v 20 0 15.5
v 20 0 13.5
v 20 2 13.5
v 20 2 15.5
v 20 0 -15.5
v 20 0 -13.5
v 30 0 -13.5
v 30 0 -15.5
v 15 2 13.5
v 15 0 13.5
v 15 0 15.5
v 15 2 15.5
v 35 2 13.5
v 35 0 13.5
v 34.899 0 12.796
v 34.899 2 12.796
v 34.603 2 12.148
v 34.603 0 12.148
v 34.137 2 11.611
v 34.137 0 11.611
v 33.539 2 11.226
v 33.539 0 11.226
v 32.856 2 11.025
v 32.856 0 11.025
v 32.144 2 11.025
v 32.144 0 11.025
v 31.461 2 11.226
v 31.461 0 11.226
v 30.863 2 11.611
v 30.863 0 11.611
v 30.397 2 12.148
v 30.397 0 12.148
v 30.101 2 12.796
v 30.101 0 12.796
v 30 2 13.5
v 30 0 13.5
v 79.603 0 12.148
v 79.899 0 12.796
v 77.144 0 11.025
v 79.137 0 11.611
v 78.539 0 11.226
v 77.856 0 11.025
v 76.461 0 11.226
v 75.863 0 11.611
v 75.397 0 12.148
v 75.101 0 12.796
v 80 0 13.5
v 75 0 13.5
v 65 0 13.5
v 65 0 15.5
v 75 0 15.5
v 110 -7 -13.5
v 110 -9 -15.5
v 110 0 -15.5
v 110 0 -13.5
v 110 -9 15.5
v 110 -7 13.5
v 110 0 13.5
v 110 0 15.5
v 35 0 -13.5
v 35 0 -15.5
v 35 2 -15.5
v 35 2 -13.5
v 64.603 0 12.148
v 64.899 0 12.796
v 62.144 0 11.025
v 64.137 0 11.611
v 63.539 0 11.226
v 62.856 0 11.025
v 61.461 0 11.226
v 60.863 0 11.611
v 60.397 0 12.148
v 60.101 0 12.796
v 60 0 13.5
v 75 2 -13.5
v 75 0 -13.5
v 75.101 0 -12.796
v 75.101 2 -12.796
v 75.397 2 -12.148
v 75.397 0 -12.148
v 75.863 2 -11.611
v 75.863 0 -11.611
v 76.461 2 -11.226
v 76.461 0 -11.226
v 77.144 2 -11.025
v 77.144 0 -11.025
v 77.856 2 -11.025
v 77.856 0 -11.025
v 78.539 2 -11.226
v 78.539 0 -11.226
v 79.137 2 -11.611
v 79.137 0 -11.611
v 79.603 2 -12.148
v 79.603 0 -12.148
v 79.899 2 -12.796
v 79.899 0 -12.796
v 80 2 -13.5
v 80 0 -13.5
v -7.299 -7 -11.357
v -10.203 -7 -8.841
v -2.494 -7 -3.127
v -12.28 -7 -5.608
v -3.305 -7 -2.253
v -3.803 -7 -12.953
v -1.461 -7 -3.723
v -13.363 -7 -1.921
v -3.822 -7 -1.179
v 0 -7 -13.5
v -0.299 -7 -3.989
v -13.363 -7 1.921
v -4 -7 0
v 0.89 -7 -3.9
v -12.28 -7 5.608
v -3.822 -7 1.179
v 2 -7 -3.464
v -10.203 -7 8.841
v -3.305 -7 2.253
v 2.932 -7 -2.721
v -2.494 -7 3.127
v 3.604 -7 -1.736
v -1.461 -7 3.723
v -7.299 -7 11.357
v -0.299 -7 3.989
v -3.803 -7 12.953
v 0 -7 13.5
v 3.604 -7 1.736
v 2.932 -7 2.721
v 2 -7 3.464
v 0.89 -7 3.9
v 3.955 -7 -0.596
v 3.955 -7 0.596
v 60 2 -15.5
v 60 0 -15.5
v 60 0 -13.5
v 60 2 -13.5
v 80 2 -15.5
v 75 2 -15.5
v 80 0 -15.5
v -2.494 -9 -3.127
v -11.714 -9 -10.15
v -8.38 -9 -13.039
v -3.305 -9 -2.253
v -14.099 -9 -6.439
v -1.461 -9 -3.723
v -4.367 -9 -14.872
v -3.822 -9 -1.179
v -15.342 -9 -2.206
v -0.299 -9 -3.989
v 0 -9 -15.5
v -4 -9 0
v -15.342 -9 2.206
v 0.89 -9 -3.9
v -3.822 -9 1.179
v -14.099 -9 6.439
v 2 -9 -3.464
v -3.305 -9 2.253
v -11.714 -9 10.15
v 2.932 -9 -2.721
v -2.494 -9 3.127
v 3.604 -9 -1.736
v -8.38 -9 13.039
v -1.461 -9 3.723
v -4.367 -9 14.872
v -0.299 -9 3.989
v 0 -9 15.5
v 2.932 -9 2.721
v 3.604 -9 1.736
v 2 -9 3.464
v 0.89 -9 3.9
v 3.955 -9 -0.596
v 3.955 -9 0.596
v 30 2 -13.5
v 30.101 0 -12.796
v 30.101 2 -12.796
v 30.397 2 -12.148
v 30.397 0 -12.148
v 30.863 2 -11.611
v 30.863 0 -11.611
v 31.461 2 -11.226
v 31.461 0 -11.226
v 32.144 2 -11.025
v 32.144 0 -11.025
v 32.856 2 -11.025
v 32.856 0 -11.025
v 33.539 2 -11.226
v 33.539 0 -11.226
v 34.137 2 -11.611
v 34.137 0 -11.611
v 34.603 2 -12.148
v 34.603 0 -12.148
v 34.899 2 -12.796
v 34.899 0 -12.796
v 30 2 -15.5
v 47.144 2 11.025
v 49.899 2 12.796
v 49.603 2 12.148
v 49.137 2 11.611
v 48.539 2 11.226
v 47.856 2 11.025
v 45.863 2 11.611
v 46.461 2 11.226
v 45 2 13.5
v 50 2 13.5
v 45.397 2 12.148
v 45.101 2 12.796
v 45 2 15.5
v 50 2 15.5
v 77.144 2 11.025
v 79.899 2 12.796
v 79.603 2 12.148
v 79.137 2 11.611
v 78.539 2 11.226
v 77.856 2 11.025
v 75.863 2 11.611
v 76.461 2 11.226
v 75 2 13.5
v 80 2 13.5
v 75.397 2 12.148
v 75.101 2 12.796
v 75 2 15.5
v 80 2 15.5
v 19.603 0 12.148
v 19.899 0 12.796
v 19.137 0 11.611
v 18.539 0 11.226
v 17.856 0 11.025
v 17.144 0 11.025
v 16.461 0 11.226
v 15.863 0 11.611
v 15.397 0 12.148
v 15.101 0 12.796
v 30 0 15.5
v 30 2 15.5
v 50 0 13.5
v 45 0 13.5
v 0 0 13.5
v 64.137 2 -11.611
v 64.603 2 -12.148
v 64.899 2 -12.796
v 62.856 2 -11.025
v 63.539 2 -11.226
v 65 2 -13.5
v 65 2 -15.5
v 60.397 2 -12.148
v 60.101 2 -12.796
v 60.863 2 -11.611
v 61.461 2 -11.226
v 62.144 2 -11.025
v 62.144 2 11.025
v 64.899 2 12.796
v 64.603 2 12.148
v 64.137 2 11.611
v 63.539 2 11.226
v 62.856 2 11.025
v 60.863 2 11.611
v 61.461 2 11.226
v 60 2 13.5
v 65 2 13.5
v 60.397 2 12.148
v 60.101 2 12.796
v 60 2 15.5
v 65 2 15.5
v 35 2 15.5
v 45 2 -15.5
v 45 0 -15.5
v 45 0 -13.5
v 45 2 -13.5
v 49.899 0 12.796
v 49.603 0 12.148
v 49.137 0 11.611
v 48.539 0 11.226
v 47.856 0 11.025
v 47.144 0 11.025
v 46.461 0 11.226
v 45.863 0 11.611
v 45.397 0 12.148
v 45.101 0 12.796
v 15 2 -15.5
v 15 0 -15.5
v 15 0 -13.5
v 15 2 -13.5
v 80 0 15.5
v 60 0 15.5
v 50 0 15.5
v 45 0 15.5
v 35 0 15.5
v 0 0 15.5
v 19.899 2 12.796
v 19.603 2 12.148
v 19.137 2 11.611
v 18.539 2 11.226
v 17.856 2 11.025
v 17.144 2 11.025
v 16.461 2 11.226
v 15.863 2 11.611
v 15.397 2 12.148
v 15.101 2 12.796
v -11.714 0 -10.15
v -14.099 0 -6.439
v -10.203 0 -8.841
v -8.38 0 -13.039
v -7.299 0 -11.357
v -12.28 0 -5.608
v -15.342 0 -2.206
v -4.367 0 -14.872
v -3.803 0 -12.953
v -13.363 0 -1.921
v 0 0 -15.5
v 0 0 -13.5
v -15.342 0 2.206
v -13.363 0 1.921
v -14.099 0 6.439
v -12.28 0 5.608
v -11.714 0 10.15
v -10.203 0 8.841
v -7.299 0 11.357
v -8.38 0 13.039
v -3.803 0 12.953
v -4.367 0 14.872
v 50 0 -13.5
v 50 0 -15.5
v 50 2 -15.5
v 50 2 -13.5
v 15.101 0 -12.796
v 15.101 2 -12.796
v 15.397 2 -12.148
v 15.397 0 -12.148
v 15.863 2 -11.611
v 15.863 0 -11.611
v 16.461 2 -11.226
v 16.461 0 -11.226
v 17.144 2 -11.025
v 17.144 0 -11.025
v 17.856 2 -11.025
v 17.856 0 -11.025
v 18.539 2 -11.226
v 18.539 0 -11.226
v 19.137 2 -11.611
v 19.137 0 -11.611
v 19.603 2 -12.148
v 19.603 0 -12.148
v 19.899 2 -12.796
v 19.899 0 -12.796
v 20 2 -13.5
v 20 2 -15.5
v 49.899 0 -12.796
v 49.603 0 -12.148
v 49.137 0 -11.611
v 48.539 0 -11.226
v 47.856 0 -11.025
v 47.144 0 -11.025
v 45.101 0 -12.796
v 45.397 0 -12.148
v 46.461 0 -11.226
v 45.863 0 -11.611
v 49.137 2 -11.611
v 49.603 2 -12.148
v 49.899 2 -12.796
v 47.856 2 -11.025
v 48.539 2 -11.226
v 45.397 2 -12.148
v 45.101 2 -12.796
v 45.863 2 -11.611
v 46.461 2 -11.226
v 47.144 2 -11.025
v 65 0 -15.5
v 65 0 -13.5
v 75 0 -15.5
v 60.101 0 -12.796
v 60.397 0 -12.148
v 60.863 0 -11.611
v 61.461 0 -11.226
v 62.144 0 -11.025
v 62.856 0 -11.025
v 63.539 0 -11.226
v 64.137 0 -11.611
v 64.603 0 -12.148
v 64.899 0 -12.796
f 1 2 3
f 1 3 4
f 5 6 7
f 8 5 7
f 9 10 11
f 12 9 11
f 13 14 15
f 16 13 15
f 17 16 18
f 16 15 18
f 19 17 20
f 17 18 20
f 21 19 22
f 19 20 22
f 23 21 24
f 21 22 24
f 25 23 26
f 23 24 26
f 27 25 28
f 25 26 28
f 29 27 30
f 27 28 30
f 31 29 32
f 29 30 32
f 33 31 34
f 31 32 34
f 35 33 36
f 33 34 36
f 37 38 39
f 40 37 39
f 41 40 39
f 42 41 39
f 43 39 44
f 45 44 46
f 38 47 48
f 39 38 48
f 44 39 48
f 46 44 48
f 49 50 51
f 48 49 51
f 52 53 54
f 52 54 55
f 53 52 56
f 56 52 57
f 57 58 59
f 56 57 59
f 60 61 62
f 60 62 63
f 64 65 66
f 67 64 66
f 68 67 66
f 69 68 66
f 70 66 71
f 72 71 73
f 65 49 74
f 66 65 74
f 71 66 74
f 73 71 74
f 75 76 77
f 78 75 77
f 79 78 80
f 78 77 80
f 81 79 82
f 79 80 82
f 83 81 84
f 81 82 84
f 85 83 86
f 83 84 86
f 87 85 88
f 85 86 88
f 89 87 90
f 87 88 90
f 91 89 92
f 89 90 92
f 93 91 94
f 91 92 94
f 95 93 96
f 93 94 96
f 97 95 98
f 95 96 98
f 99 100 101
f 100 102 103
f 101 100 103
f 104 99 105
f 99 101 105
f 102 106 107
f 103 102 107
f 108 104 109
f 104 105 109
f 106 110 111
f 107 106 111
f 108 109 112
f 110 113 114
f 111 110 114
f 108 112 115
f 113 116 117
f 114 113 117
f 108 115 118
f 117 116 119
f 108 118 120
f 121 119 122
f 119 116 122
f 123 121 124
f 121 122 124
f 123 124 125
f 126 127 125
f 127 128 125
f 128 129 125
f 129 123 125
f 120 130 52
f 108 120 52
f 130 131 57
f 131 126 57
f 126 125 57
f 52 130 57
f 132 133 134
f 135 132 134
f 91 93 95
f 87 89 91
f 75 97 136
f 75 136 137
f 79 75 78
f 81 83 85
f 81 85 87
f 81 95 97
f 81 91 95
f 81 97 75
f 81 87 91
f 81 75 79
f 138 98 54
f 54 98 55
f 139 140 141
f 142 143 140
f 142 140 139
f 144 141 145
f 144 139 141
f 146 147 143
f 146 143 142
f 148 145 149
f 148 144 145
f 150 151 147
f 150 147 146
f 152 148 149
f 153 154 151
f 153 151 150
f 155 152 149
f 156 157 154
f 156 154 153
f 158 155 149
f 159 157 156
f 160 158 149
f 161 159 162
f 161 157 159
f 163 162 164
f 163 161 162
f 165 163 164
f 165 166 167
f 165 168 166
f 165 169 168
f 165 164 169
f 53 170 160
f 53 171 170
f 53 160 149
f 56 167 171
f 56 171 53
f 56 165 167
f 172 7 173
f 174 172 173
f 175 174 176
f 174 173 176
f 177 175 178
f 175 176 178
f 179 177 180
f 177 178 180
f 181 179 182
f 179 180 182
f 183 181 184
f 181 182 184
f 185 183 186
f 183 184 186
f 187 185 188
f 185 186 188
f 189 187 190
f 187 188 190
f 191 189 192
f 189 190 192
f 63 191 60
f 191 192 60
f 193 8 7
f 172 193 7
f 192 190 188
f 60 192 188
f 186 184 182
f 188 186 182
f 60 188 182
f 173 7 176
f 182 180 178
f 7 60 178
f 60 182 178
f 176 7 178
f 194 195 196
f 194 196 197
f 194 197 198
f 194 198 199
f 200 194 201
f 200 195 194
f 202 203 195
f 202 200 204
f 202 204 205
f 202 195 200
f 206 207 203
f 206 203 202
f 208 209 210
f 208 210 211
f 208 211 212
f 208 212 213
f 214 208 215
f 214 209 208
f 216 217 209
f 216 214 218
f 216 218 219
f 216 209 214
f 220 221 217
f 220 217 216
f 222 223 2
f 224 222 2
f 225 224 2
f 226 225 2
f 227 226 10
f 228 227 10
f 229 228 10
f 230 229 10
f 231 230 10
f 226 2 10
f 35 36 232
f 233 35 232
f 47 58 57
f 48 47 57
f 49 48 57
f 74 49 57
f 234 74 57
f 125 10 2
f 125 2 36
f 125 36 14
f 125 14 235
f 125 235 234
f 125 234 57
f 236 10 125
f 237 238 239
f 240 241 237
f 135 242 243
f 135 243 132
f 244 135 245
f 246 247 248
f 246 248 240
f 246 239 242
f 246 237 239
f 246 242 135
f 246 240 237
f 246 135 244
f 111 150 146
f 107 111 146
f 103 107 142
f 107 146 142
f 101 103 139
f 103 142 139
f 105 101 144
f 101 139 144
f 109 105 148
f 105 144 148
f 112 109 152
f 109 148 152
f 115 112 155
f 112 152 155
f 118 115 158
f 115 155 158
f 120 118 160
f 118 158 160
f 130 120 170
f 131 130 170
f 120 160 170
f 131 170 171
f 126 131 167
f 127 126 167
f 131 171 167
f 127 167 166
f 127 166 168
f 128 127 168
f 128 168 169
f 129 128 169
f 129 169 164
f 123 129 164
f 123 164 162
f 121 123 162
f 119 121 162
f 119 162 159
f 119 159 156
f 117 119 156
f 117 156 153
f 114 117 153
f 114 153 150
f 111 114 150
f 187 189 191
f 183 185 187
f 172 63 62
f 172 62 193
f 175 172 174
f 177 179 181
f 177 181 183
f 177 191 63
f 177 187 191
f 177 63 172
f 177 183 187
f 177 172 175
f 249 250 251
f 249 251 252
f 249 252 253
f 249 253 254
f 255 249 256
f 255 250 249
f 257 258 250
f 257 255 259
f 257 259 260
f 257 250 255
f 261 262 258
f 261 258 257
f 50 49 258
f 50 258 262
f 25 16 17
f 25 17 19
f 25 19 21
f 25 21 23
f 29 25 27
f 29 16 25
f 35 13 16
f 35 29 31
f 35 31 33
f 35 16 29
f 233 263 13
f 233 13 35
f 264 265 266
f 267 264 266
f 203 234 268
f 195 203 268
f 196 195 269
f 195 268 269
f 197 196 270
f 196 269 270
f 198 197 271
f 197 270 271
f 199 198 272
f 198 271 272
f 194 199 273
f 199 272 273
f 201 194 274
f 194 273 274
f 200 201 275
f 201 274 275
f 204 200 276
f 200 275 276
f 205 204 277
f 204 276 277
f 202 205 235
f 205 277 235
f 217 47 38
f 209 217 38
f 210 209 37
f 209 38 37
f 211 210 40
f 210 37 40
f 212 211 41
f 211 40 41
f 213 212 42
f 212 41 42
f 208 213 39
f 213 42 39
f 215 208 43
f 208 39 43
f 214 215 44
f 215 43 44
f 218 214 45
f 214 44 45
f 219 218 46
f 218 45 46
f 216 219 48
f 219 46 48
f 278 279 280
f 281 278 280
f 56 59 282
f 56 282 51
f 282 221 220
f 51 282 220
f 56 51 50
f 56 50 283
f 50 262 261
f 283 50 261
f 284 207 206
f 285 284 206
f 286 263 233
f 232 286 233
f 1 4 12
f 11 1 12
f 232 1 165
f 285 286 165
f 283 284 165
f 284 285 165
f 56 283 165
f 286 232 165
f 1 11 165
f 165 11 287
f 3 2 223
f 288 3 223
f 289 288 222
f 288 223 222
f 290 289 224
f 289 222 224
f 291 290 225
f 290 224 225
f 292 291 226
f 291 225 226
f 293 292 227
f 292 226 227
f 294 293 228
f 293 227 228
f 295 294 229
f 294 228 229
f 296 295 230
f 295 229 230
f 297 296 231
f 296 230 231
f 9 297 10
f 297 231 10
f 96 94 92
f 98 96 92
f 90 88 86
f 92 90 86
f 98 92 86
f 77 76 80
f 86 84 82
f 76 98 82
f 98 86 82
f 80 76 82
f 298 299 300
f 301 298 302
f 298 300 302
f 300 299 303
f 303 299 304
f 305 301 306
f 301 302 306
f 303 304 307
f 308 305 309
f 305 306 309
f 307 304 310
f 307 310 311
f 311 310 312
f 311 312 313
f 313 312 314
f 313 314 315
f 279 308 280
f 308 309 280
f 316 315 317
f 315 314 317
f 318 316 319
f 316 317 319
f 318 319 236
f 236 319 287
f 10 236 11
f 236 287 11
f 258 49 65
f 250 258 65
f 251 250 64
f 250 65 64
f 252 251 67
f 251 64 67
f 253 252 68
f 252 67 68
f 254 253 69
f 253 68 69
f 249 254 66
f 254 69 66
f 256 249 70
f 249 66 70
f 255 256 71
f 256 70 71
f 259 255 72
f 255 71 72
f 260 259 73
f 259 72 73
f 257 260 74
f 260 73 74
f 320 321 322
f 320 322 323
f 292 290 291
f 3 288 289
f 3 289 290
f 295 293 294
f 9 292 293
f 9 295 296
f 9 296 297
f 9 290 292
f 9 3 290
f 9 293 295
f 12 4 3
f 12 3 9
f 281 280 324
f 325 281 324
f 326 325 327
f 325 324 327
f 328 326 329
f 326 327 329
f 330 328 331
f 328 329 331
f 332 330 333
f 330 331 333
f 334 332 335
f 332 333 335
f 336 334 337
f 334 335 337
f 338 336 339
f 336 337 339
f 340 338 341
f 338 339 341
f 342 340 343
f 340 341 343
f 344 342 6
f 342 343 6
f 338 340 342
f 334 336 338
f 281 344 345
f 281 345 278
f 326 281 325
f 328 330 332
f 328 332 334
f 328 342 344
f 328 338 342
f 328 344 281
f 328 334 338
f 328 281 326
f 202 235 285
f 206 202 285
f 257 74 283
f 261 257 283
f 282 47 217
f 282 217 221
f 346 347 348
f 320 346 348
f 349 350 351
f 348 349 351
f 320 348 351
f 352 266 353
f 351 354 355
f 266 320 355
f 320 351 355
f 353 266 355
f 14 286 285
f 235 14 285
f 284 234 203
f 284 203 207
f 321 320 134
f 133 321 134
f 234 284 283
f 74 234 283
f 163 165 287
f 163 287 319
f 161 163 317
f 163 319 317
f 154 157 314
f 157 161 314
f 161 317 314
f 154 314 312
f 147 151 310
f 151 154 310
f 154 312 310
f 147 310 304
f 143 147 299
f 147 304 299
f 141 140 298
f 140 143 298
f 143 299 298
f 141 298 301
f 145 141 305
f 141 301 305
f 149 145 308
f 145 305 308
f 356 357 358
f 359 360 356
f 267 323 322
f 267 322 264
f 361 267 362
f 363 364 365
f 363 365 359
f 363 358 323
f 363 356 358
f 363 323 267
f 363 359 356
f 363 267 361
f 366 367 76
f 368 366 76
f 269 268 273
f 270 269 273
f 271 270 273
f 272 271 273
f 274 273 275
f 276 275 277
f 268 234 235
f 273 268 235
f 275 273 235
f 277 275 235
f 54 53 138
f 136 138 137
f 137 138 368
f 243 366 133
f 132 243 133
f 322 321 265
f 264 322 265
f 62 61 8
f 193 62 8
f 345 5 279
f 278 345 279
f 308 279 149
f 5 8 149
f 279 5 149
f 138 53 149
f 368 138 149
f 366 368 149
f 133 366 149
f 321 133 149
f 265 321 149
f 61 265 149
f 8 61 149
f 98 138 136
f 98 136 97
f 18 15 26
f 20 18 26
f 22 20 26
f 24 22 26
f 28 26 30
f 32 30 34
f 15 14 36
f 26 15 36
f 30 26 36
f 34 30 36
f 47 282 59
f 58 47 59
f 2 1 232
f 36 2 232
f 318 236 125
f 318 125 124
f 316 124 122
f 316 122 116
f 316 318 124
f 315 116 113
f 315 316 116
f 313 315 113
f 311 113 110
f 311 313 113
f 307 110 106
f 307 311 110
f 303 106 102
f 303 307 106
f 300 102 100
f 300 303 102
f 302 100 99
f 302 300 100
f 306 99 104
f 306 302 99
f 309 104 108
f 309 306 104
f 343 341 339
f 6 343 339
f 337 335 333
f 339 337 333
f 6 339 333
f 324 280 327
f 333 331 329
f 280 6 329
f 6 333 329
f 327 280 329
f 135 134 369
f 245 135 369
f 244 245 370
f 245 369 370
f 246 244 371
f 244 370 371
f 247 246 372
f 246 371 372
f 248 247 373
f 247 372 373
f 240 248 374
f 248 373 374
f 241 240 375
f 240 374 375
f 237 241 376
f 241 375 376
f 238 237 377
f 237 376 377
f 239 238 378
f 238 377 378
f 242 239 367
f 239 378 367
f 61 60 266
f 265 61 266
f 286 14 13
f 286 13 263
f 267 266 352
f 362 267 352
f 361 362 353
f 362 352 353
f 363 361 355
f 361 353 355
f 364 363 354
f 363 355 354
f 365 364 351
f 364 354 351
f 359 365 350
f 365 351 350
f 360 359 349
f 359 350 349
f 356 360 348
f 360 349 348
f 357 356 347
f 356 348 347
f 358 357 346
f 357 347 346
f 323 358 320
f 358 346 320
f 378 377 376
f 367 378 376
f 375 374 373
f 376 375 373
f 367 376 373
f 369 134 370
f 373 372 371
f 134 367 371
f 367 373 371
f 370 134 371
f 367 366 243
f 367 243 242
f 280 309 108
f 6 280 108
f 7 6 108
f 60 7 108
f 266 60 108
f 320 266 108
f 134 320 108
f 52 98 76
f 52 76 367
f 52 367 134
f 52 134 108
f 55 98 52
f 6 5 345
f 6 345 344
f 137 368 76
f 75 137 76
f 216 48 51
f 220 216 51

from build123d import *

# Parameters (mm, degrees)
F1_DEPTH = 7
F2_T     = 2
F3_D     = 8
F4_W     = 5
F4_H     = 2
F5_DEPTH = 2


# Not quite as in the source:
# - a feature of the source that left no trace in its solid (it failed there, or was rolled back) is left out


with BuildPart() as f1:
    # F0 (on Front) → F1 (new body)
    with BuildSketch(Plane.XZ):
        with BuildLine():
            ThreePointArc((0, -13.5), (9.545941546, -9.545941546), (13.5, 0))
            ThreePointArc((13.5, 0), (9.545941546, 9.545941546), (0, 13.5))
            Line((0, 13.5), (0, -13.5))
        make_face()
        with BuildLine():
            ThreePointArc((0, 13.5), (9.545941546, 9.545941546), (13.5, 0))
            ThreePointArc((13.5, 0), (9.545941546, -9.545941546), (0, -13.5))
            Line((0, -13.5), (110, -13.5))
            Line((110, -13.5), (110, 13.5))
            Line((110, 13.5), (0, 13.5))
        make_face()
        with BuildLine():
            Line((0, -13.5), (0, 13.5))
            ThreePointArc((0, 13.5), (-13.5, 0), (0, -13.5))
        make_face()
    extrude(amount=F1_DEPTH)

    # F2
    f2_openings = [f1.faces().sort_by_distance(p)[0] for p in [
        (49.660922, 0, 0),
        (110, -3.5, 0),
    ]]
    offset(amount=F2_T, openings=f2_openings, kind=Kind.INTERSECTION)

    # F3 (through all)
    with Locations(Plane(origin=(0, 0, 0), x_dir=(1, 0, 0), z_dir=(0, 1, 0))):
        with Locations((0, 0)):
            Hole(F3_D / 2)

    # F4 (on face) → F5 (join)
    with BuildSketch(Plane(origin=(0, 0, 0), x_dir=(-1, 0, 0), z_dir=(0, 1, 0))):
        with Locations((-17.5, -14.5)):
            Rectangle(F4_W, F4_H)
        with BuildLine():
            Line((-20, -13.5), (-15, -13.5))
            ThreePointArc((-15, -13.5), (-17.5, -11), (-20, -13.5))
        make_face()
        with Locations((-32.5, -14.5)):
            Rectangle(F4_W, F4_H)
        with BuildLine():
            Line((-35, -13.5), (-30, -13.5))
            ThreePointArc((-30, -13.5), (-32.5, -11), (-35, -13.5))
        make_face()
        with Locations((-47.5, -14.5)):
            Rectangle(F4_W, F4_H)
        with BuildLine():
            Line((-50, -13.5), (-45, -13.5))
            ThreePointArc((-45, -13.5), (-47.5, -11), (-50, -13.5))
        make_face()
        with Locations((-62.5, -14.5)):
            Rectangle(F4_W, F4_H)
        with BuildLine():
            Line((-65, -13.5), (-60, -13.5))
            ThreePointArc((-60, -13.5), (-62.5, -11), (-65, -13.5))
        make_face()
        with Locations((-77.5, -14.5)):
            Rectangle(F4_W, F4_H)
        with BuildLine():
            Line((-80, -13.5), (-75, -13.5))
            ThreePointArc((-75, -13.5), (-77.5, -11), (-80, -13.5))
        make_face()
        with Locations((-17.5, 14.5)):
            Rectangle(F4_W, F4_H)
        with BuildLine():
            ThreePointArc((-20, 13.5), (-17.5, 11), (-15, 13.5))
            Line((-15, 13.5), (-20, 13.5))
        make_face()
        with BuildLine():
            ThreePointArc((-35, 13.5), (-32.5, 11), (-30, 13.5))
            Line((-30, 13.5), (-35, 13.5))
        make_face()
        with Locations((-32.5, 14.5)):
            Rectangle(F4_W, F4_H)
        with BuildLine():
            ThreePointArc((-50, 13.5), (-47.5, 11), (-45, 13.5))
            Line((-45, 13.5), (-50, 13.5))
        make_face()
        with Locations((-47.5, 14.5)):
            Rectangle(F4_W, F4_H)
        with BuildLine():
            ThreePointArc((-65, 13.5), (-62.5, 11), (-60, 13.5))
            Line((-60, 13.5), (-65, 13.5))
        make_face()
        with Locations((-62.5, 14.5)):
            Rectangle(F4_W, F4_H)
        with BuildLine():
            ThreePointArc((-80, 13.5), (-77.5, 11), (-75, 13.5))
            Line((-75, 13.5), (-80, 13.5))
        make_face()
        with Locations((-77.5, 14.5)):
            Rectangle(F4_W, F4_H)
    extrude(amount=F5_DEPTH)


solid = f1.part
